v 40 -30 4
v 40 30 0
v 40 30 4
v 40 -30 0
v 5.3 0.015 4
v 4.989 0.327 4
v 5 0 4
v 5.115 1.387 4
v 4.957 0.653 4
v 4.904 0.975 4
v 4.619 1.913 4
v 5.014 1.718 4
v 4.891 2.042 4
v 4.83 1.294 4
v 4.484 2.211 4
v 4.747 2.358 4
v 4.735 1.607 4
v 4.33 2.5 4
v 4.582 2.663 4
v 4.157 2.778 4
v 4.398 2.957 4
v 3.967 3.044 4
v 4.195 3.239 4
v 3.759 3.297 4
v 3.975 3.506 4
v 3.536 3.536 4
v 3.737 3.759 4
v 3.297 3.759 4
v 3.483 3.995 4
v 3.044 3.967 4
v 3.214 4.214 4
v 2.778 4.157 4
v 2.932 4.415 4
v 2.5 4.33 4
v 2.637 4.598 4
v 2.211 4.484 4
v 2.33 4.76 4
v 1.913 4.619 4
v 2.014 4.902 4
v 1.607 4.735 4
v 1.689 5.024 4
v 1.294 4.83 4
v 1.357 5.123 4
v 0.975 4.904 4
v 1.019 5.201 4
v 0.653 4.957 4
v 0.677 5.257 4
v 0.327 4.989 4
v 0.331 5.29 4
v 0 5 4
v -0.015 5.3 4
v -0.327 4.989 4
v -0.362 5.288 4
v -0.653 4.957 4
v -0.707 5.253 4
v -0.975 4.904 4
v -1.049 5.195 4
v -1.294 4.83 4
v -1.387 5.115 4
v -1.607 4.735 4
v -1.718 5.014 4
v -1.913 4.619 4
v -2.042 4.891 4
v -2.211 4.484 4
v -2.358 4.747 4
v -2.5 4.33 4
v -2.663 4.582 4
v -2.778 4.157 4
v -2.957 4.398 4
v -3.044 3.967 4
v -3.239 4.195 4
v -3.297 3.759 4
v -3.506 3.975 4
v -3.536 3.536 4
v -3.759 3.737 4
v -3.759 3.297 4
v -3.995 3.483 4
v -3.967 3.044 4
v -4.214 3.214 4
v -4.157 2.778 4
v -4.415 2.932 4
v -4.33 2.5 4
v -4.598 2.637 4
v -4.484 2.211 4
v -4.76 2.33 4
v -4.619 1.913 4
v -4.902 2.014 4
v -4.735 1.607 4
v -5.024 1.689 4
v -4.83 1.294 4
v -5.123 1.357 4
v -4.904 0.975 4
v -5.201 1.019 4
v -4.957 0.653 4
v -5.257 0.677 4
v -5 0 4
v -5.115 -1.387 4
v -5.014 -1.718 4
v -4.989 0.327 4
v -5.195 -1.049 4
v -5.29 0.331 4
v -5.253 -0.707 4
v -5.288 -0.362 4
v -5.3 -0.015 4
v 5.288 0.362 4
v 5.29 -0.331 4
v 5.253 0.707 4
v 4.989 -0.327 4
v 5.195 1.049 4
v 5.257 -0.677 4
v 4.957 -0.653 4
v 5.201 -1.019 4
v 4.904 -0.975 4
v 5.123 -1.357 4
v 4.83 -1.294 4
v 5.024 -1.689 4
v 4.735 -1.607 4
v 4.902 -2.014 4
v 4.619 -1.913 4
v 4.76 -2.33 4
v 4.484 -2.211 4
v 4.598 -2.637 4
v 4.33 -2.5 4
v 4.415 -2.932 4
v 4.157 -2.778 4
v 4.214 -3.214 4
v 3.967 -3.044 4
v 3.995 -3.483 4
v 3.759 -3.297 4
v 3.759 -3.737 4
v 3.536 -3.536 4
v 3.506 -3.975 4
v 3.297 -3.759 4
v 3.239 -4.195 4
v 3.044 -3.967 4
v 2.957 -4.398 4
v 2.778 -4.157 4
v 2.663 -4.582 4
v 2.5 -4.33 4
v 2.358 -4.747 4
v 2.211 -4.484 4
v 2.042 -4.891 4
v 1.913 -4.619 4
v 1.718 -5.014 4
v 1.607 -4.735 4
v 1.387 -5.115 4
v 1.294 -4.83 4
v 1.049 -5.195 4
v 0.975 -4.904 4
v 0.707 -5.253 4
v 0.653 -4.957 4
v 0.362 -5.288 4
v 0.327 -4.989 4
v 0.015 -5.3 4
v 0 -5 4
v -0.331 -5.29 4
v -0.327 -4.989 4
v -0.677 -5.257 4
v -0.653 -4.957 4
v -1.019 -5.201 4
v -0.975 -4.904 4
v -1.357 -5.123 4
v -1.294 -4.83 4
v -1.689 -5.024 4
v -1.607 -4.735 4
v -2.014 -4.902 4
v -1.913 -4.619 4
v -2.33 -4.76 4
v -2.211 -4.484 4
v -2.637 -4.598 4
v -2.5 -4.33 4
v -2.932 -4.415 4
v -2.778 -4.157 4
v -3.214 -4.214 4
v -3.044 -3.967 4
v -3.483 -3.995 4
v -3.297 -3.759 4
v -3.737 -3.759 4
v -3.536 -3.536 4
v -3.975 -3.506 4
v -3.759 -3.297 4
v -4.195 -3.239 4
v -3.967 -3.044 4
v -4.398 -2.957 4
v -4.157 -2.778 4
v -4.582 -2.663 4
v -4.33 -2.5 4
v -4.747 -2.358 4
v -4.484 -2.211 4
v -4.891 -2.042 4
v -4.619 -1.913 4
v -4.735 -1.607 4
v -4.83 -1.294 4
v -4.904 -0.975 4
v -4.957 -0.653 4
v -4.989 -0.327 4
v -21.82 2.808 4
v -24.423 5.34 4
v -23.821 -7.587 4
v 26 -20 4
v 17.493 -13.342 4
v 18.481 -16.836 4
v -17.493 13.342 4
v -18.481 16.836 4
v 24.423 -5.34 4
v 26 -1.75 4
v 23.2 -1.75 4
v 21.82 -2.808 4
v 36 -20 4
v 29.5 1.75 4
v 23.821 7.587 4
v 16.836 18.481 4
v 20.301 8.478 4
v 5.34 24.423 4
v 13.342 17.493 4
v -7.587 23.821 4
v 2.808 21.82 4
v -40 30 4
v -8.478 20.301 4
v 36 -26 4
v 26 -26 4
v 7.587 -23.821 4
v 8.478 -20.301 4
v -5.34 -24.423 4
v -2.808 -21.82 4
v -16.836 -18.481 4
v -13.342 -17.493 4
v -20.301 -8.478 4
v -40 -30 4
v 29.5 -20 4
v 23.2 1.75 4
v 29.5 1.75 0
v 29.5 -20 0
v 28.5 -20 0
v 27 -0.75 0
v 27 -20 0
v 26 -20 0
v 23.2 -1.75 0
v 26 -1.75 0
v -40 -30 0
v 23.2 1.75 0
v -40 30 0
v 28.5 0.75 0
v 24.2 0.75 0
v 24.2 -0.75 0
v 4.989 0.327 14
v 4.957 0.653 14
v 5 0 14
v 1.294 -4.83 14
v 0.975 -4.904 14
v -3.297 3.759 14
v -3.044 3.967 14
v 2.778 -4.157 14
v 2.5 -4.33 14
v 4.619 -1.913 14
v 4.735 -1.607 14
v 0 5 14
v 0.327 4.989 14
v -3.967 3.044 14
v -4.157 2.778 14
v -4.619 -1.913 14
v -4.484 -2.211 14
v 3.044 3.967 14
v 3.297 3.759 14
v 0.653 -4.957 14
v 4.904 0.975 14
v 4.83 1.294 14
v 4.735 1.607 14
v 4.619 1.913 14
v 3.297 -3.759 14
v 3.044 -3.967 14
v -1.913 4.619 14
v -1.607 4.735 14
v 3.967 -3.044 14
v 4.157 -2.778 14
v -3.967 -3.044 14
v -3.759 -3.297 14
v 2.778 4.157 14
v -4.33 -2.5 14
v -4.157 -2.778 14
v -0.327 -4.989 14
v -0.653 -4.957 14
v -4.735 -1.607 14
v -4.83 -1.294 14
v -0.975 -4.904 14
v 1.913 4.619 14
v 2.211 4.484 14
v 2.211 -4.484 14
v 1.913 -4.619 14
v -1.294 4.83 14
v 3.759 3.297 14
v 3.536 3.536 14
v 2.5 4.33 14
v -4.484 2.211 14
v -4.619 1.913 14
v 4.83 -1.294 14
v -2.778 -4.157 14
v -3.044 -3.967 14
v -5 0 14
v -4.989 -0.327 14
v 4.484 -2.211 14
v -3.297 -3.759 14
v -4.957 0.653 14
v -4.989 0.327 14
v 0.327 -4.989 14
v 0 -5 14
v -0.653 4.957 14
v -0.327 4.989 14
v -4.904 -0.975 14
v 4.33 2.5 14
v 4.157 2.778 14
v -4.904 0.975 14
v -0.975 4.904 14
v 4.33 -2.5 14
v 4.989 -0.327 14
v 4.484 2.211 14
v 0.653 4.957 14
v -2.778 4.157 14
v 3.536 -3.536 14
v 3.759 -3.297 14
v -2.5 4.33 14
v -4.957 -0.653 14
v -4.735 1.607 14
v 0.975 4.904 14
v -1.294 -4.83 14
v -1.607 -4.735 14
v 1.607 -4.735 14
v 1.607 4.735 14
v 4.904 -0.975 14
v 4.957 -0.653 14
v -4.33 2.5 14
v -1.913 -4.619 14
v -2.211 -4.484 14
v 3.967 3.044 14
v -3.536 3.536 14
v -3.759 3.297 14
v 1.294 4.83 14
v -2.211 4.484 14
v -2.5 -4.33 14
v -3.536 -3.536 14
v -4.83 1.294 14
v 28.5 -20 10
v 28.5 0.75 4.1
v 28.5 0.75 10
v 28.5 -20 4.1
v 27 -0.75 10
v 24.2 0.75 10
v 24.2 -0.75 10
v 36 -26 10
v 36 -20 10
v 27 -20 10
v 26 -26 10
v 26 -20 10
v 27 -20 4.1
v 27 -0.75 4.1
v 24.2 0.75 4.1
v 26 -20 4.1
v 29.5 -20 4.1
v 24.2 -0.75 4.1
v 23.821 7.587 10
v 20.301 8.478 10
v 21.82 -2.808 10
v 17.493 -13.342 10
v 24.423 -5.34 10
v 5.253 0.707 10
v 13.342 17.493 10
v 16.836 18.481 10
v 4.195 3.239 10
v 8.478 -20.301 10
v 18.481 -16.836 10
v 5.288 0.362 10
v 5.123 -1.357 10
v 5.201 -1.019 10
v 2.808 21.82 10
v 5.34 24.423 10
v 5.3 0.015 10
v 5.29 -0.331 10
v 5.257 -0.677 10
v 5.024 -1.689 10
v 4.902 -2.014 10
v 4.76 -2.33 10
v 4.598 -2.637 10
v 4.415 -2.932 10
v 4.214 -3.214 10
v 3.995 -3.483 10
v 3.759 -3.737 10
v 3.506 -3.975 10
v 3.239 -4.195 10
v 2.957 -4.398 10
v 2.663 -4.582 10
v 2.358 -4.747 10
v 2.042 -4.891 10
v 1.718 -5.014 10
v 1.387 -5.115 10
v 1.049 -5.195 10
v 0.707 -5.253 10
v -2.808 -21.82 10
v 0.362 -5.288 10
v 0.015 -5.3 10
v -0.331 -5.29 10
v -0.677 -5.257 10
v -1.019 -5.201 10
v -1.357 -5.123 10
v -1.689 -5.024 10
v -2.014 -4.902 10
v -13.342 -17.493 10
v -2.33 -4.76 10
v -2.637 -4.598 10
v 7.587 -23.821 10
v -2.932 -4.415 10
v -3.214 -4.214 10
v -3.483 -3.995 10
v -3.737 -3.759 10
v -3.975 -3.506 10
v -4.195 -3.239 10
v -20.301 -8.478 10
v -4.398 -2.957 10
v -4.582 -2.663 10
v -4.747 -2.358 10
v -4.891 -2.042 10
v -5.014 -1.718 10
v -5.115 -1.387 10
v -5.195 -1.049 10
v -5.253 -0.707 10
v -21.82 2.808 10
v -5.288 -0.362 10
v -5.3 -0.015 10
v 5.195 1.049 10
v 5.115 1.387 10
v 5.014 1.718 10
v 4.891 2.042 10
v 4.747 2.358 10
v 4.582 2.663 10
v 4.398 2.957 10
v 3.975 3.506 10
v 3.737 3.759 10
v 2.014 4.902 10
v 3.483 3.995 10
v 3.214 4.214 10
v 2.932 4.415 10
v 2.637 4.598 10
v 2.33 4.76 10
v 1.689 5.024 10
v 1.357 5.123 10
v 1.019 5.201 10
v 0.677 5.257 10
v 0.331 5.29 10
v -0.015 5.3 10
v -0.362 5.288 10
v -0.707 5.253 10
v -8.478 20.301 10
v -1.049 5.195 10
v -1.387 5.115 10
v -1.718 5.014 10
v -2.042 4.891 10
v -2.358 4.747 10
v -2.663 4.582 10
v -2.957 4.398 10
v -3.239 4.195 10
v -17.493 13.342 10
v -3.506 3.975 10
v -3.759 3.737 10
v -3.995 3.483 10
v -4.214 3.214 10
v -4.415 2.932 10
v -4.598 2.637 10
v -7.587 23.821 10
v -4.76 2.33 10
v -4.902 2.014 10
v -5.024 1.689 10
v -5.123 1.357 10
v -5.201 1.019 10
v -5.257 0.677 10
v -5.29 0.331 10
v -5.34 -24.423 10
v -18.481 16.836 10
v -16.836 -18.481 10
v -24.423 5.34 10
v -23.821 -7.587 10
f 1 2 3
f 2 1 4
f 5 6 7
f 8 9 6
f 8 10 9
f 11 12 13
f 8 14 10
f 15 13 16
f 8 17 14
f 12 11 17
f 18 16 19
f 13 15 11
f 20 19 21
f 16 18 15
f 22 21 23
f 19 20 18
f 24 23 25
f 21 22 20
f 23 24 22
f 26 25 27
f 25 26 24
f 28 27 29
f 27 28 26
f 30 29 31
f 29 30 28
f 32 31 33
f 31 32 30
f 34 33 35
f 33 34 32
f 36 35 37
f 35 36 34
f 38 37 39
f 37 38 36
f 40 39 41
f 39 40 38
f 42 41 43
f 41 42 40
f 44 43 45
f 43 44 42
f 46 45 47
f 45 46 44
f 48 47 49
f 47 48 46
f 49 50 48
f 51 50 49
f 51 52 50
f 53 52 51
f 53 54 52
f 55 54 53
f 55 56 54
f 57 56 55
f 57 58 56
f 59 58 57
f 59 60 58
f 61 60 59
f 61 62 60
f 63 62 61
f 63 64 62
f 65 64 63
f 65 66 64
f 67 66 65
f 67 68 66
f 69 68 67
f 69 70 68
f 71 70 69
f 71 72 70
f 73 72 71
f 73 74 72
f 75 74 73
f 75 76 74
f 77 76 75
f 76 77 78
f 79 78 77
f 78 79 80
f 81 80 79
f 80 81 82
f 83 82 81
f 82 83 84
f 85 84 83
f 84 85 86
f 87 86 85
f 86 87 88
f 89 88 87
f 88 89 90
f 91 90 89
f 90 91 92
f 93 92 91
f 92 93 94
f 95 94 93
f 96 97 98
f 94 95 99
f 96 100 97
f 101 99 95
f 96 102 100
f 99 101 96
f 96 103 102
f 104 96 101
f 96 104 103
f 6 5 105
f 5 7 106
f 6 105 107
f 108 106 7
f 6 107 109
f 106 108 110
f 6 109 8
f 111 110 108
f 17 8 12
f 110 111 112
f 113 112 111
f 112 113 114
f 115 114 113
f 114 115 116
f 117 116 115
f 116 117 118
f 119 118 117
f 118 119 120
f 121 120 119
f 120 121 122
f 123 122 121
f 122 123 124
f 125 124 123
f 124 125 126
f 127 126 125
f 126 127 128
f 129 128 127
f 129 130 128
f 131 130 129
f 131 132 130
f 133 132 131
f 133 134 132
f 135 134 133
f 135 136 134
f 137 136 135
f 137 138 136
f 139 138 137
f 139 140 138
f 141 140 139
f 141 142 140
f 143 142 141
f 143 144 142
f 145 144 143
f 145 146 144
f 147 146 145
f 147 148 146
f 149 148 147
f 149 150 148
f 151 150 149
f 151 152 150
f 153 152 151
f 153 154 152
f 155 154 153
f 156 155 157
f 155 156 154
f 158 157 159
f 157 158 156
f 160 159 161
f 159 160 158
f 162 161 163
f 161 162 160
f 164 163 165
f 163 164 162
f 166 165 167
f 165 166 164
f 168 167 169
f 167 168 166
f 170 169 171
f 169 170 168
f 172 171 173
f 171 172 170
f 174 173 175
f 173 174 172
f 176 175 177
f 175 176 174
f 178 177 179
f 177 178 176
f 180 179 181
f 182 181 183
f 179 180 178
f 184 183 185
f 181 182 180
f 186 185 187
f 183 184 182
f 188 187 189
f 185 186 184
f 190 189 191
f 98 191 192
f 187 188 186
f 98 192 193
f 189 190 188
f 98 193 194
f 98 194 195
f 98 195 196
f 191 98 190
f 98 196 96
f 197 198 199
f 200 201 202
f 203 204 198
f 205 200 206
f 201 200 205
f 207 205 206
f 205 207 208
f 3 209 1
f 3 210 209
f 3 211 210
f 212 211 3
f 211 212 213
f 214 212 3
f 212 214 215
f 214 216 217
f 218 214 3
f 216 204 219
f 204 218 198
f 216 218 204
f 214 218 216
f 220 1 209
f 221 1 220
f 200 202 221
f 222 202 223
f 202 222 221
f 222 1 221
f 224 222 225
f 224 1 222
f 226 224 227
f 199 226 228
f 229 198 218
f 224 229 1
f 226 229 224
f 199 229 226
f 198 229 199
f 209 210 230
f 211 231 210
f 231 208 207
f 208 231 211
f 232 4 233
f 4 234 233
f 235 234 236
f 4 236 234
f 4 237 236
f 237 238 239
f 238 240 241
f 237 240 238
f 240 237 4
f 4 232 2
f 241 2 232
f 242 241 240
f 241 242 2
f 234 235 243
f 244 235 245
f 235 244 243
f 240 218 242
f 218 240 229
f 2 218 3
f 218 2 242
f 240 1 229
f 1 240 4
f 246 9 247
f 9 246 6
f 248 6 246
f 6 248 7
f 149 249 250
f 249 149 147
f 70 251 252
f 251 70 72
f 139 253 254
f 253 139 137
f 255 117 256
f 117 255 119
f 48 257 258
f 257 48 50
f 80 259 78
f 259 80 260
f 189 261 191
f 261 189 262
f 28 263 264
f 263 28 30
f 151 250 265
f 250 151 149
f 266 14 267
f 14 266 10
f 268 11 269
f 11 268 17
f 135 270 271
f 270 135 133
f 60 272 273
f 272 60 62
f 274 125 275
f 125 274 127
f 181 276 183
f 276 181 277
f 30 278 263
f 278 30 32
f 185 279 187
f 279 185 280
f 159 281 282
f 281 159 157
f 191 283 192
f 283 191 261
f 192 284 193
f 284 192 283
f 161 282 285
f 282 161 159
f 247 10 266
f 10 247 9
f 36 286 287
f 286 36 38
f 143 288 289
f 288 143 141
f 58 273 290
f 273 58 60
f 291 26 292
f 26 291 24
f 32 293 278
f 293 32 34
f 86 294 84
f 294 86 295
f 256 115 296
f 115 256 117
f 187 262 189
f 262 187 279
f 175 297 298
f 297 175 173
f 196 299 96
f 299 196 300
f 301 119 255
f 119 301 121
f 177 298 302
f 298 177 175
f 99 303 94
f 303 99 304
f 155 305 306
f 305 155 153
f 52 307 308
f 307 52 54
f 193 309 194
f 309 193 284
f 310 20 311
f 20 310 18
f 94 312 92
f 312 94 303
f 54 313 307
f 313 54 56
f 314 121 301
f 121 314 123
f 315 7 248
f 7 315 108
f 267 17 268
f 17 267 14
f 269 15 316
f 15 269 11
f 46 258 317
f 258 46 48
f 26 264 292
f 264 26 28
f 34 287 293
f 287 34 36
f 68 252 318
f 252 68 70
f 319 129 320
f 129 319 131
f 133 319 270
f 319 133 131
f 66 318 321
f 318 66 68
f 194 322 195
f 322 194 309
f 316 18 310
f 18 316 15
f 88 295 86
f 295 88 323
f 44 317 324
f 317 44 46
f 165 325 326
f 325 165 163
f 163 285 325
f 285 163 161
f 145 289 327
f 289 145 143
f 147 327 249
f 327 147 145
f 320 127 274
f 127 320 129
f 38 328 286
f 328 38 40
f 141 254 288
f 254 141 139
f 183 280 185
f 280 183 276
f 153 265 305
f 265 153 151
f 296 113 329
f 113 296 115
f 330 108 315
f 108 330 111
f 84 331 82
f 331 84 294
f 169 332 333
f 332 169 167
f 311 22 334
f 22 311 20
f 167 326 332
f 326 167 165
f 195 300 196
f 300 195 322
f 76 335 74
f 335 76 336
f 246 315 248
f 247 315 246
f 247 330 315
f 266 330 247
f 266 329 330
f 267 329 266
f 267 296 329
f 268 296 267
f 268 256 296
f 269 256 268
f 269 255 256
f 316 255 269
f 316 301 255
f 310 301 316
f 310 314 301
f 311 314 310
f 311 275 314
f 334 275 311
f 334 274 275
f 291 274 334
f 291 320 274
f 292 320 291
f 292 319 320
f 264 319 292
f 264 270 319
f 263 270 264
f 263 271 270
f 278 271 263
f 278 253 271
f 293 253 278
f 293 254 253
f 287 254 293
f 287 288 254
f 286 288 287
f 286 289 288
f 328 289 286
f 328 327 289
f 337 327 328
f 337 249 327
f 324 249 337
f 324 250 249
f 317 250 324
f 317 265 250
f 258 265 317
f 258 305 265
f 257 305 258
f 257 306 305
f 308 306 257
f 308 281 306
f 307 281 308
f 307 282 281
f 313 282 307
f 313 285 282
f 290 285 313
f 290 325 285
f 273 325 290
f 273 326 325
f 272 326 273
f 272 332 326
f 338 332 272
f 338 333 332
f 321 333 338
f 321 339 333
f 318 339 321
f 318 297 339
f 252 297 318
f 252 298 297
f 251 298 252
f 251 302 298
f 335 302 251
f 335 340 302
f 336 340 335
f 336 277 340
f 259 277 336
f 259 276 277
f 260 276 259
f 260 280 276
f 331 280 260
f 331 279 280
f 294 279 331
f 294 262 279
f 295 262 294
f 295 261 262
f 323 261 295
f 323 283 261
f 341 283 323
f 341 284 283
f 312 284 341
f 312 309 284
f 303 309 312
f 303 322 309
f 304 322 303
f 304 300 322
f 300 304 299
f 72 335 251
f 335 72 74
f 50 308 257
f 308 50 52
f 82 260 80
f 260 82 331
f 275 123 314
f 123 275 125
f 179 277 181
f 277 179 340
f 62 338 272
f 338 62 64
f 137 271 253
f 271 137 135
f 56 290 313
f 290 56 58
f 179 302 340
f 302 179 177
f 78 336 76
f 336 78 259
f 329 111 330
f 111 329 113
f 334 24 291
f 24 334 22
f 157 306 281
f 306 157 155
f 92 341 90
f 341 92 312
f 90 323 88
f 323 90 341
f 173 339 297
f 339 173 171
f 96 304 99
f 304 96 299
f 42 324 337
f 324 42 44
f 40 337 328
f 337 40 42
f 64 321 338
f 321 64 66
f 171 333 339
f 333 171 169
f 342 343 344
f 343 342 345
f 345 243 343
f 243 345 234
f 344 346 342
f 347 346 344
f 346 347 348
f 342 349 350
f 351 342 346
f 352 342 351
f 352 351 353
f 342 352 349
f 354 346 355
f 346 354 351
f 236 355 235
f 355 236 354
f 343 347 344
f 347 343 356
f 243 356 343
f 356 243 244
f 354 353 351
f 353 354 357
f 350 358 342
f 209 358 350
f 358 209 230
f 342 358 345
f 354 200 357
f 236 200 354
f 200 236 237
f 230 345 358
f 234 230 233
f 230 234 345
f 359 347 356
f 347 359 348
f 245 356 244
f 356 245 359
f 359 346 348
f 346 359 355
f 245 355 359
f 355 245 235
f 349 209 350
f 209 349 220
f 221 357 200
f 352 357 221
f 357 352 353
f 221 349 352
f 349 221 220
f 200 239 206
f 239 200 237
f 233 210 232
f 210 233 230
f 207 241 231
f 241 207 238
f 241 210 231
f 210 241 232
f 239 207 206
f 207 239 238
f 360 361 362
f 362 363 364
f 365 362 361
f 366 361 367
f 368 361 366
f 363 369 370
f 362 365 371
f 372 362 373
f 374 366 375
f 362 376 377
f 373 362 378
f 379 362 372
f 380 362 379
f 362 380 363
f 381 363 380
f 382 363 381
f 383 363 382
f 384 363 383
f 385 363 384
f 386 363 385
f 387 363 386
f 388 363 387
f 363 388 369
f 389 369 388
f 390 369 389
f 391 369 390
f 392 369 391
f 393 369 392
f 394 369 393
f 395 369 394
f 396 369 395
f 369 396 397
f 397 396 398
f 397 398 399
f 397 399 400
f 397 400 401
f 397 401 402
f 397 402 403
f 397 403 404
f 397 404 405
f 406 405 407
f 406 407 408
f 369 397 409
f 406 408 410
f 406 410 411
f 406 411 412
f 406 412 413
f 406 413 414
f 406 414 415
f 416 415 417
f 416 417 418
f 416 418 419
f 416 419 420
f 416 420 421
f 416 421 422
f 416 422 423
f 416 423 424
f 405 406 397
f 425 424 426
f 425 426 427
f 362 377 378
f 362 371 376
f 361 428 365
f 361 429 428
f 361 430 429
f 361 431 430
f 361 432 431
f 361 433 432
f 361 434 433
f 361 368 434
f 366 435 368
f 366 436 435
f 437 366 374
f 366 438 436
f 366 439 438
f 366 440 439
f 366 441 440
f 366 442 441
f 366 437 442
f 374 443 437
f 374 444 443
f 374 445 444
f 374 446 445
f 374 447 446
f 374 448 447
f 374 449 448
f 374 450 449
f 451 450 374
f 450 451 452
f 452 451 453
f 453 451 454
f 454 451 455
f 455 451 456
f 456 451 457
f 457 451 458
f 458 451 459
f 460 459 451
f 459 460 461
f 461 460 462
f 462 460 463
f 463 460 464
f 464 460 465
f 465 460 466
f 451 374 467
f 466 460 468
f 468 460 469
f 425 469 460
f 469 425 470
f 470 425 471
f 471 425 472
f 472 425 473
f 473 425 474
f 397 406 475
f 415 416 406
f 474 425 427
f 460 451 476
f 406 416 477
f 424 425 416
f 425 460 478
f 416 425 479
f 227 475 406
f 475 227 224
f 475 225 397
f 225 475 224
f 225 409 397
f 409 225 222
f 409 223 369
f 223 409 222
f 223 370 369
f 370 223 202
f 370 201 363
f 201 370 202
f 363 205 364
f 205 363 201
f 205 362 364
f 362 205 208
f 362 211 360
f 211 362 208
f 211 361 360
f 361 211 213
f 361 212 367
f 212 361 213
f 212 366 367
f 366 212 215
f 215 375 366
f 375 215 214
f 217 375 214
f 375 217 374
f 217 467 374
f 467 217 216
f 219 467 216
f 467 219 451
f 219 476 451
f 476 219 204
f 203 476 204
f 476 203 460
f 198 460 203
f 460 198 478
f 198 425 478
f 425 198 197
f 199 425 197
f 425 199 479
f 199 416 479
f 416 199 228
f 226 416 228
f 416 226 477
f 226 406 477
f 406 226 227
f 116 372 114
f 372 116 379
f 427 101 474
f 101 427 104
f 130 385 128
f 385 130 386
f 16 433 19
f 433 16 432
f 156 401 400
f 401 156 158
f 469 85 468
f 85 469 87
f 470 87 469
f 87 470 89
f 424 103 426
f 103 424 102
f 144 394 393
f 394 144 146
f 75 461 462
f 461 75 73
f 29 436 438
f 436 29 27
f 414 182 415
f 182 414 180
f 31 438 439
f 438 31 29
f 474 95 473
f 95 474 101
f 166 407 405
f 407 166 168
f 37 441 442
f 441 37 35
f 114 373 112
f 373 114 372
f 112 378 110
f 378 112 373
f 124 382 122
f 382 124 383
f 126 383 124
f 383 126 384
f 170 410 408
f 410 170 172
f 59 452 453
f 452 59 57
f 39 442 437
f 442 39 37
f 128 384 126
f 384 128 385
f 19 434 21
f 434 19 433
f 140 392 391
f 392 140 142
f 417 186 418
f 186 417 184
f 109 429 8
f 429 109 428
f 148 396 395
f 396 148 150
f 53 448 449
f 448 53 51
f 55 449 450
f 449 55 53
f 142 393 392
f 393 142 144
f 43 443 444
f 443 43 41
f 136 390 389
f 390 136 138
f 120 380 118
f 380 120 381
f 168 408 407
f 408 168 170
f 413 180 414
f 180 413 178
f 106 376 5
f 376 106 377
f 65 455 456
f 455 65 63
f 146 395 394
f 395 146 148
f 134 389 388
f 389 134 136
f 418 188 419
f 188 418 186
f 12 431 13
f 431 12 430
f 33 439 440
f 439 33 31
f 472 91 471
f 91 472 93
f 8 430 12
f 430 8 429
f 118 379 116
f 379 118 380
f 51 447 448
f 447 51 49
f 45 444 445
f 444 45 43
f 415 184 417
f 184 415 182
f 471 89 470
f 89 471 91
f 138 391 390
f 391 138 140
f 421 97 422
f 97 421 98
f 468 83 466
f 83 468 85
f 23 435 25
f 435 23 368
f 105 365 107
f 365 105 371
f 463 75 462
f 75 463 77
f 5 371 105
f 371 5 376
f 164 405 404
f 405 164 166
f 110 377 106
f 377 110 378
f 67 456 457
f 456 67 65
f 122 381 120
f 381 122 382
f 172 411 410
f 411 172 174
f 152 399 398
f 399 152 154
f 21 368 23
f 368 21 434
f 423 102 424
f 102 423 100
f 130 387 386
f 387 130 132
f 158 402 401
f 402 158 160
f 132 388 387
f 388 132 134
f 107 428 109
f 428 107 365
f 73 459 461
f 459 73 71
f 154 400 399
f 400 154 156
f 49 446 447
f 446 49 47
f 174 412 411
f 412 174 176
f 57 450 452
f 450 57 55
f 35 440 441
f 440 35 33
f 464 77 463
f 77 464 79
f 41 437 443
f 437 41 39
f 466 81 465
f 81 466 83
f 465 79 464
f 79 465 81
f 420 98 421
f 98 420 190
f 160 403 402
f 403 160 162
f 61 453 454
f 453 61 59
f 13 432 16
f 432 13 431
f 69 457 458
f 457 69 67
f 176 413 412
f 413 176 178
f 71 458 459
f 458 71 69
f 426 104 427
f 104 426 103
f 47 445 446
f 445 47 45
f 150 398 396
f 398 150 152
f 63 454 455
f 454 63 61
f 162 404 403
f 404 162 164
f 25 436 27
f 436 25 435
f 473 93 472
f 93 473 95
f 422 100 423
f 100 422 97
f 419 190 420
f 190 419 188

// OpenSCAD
cadverify_only = "";
module instance(name, part, unit = 1) {
    echo(cadverify_instance = [name, part, unit]);
    if (cadverify_only == "" || cadverify_only == name) children();
}

// Part selector: base, wheel, assembly
part = "assembly"; // [base, wheel, assembly]

$fn = 96;

// Parameters
Rt = 25;        // wheel tip radius (50mm across)
Rr = 22;        // wheel root radius
Nteeth = 12;
wheel_t = 6;    // wheel thickness
bore_r = 5.3;   // wheel bore radius (post 5.0 + 0.3 clearance)
post_r = 5;
post_h = 14;    // base bottom to post top
base_t = 4;     // base plate thickness
plate_x = 80;
plate_y = 60;
gap_angle = 37.3333333; // gap center for nominal assembly

module wheel() {
    pts = [ for (k=[0:2*Nteeth-1])
        let(i=floor(k/2),
            a = (k%2==0) ? i*360/Nteeth : i*360/Nteeth+25,
            r = (k%2==0) ? Rr : Rt)
        [r*cos(a), r*sin(a)] ];
    difference() {
        linear_extrude(height=wheel_t, convexity=4)
            polygon(pts);
        translate([0,0,-0.1])
            cylinder(h=wheel_t+0.2, r=bore_r);
    }
}

module base() {
    difference() {
        union() {
            // plate
            translate([-plate_x/2, -plate_y/2, 0])
                cube([plate_x, plate_y, base_t]);
            // post
            cylinder(h=post_h, r=post_r);
            // pawl backbone (tall)
            translate([27, -20, 0])
                cube([1.5, 20.75, 10]);
            // pawl finger (tall, radial)
            translate([24.2, -0.75, 0])
                cube([4.3, 1.5, 10]);
            // anchor block (full height fixation)
            translate([26, -26, 0])
                cube([10, 6, 10]);
        }
        // slot voids through plate (z -0.1..4.1)
        translate([26, -20, -0.1]) cube([1, 19.25, 4.2]);      // west of backbone
        translate([28.5, -20, -0.1]) cube([1, 20.75, 4.2]);    // east of backbone
        translate([23.2, 0.75, -0.1]) cube([6.3, 1, 4.2]);      // north
        translate([23.2, -1.75, -0.1]) cube([3.8, 1, 4.2]);     // south of finger tip
        translate([23.2, -1.75, -0.1]) cube([1, 3.5, 4.2]);     // west of tip
    }
}

if (part == "wheel") {
    echo(cadverify_spec = [
        ["bounds", [[-25, -25, 0], [25, 25, 6]]],
        ["bodies", 1],
        ["through_holes", 1],
        ["support_faces", [["bottom", "-z", 1000]]],
        ["overhangs_allowed", []],
        ["copies", 1],
        ["details", [
            ["hub", "material", [[5, 5, 0.5], [10, 10, 5.5]], 0.9],
            ["bore", "hole", [0, 0, 7], [0, 0, -1], [[0, 10.6], [5, 10.6]]],
            ["rim", "thickness", [15, 0, 7], [0, 0, -1], 6],
            ["teeth", "view", [[20, -15, 0], [25, 15, 6]]]
        ]]
    ]);
    wheel();
} else if (part == "base") {
    echo(cadverify_spec = [
        ["bounds", [[-40, -30, 0], [40, 30, 14]]],
        ["bodies", 1],
        ["through_holes", 1],
        ["support_faces", [["bottom", "-z", 4000]]],
        ["overhangs_allowed", []],
        ["copies", 1],
        ["details", [
            ["pawl_arm", "material", [[27.1, -10, 4.1], [28.4, -5, 9.9]], 0.9],
            ["slot", "void", [[26.1, -15, 0.5], [26.9, -5, 3.5]], 0.9],
            ["base_floor", "thickness", [-20, 20, -1], [0, 0, 1], 4],
            ["pawl_tip", "view", [[23, -2, 4], [26, 2, 10]]]
        ]]
    ]);
    base();
} else if (part == "assembly") {
    echo(cadverify_spec = [
        ["bounds", [[-40, -30, 0], [40, 30, 14]]],
        ["support_faces", [["table", "-z", 4000]]],
        ["motions", [
            ["free", ["wheel1"], "rotate", [0, 0, 4], [0, 0, 1], [0, -30],
                ["flex", [["wheel1", "base1", 1.0, "pawl arm bends as tooth passes"]]]],
            ["locked", ["wheel1"], "rotate", [0, 0, 4], [0, 0, 1], [0, 10],
                ["stops", [10]]]
        ]],
        ["assembly_order", [
            [["base1"], [0, 0, 0]],
            [["wheel1"], [0, 0, -1]]
        ]]
    ]);
    instance("base1", "base") base();
    instance("wheel1", "wheel") translate([0, 0, 4]) rotate([0, 0, -gap_angle]) wheel();
}
